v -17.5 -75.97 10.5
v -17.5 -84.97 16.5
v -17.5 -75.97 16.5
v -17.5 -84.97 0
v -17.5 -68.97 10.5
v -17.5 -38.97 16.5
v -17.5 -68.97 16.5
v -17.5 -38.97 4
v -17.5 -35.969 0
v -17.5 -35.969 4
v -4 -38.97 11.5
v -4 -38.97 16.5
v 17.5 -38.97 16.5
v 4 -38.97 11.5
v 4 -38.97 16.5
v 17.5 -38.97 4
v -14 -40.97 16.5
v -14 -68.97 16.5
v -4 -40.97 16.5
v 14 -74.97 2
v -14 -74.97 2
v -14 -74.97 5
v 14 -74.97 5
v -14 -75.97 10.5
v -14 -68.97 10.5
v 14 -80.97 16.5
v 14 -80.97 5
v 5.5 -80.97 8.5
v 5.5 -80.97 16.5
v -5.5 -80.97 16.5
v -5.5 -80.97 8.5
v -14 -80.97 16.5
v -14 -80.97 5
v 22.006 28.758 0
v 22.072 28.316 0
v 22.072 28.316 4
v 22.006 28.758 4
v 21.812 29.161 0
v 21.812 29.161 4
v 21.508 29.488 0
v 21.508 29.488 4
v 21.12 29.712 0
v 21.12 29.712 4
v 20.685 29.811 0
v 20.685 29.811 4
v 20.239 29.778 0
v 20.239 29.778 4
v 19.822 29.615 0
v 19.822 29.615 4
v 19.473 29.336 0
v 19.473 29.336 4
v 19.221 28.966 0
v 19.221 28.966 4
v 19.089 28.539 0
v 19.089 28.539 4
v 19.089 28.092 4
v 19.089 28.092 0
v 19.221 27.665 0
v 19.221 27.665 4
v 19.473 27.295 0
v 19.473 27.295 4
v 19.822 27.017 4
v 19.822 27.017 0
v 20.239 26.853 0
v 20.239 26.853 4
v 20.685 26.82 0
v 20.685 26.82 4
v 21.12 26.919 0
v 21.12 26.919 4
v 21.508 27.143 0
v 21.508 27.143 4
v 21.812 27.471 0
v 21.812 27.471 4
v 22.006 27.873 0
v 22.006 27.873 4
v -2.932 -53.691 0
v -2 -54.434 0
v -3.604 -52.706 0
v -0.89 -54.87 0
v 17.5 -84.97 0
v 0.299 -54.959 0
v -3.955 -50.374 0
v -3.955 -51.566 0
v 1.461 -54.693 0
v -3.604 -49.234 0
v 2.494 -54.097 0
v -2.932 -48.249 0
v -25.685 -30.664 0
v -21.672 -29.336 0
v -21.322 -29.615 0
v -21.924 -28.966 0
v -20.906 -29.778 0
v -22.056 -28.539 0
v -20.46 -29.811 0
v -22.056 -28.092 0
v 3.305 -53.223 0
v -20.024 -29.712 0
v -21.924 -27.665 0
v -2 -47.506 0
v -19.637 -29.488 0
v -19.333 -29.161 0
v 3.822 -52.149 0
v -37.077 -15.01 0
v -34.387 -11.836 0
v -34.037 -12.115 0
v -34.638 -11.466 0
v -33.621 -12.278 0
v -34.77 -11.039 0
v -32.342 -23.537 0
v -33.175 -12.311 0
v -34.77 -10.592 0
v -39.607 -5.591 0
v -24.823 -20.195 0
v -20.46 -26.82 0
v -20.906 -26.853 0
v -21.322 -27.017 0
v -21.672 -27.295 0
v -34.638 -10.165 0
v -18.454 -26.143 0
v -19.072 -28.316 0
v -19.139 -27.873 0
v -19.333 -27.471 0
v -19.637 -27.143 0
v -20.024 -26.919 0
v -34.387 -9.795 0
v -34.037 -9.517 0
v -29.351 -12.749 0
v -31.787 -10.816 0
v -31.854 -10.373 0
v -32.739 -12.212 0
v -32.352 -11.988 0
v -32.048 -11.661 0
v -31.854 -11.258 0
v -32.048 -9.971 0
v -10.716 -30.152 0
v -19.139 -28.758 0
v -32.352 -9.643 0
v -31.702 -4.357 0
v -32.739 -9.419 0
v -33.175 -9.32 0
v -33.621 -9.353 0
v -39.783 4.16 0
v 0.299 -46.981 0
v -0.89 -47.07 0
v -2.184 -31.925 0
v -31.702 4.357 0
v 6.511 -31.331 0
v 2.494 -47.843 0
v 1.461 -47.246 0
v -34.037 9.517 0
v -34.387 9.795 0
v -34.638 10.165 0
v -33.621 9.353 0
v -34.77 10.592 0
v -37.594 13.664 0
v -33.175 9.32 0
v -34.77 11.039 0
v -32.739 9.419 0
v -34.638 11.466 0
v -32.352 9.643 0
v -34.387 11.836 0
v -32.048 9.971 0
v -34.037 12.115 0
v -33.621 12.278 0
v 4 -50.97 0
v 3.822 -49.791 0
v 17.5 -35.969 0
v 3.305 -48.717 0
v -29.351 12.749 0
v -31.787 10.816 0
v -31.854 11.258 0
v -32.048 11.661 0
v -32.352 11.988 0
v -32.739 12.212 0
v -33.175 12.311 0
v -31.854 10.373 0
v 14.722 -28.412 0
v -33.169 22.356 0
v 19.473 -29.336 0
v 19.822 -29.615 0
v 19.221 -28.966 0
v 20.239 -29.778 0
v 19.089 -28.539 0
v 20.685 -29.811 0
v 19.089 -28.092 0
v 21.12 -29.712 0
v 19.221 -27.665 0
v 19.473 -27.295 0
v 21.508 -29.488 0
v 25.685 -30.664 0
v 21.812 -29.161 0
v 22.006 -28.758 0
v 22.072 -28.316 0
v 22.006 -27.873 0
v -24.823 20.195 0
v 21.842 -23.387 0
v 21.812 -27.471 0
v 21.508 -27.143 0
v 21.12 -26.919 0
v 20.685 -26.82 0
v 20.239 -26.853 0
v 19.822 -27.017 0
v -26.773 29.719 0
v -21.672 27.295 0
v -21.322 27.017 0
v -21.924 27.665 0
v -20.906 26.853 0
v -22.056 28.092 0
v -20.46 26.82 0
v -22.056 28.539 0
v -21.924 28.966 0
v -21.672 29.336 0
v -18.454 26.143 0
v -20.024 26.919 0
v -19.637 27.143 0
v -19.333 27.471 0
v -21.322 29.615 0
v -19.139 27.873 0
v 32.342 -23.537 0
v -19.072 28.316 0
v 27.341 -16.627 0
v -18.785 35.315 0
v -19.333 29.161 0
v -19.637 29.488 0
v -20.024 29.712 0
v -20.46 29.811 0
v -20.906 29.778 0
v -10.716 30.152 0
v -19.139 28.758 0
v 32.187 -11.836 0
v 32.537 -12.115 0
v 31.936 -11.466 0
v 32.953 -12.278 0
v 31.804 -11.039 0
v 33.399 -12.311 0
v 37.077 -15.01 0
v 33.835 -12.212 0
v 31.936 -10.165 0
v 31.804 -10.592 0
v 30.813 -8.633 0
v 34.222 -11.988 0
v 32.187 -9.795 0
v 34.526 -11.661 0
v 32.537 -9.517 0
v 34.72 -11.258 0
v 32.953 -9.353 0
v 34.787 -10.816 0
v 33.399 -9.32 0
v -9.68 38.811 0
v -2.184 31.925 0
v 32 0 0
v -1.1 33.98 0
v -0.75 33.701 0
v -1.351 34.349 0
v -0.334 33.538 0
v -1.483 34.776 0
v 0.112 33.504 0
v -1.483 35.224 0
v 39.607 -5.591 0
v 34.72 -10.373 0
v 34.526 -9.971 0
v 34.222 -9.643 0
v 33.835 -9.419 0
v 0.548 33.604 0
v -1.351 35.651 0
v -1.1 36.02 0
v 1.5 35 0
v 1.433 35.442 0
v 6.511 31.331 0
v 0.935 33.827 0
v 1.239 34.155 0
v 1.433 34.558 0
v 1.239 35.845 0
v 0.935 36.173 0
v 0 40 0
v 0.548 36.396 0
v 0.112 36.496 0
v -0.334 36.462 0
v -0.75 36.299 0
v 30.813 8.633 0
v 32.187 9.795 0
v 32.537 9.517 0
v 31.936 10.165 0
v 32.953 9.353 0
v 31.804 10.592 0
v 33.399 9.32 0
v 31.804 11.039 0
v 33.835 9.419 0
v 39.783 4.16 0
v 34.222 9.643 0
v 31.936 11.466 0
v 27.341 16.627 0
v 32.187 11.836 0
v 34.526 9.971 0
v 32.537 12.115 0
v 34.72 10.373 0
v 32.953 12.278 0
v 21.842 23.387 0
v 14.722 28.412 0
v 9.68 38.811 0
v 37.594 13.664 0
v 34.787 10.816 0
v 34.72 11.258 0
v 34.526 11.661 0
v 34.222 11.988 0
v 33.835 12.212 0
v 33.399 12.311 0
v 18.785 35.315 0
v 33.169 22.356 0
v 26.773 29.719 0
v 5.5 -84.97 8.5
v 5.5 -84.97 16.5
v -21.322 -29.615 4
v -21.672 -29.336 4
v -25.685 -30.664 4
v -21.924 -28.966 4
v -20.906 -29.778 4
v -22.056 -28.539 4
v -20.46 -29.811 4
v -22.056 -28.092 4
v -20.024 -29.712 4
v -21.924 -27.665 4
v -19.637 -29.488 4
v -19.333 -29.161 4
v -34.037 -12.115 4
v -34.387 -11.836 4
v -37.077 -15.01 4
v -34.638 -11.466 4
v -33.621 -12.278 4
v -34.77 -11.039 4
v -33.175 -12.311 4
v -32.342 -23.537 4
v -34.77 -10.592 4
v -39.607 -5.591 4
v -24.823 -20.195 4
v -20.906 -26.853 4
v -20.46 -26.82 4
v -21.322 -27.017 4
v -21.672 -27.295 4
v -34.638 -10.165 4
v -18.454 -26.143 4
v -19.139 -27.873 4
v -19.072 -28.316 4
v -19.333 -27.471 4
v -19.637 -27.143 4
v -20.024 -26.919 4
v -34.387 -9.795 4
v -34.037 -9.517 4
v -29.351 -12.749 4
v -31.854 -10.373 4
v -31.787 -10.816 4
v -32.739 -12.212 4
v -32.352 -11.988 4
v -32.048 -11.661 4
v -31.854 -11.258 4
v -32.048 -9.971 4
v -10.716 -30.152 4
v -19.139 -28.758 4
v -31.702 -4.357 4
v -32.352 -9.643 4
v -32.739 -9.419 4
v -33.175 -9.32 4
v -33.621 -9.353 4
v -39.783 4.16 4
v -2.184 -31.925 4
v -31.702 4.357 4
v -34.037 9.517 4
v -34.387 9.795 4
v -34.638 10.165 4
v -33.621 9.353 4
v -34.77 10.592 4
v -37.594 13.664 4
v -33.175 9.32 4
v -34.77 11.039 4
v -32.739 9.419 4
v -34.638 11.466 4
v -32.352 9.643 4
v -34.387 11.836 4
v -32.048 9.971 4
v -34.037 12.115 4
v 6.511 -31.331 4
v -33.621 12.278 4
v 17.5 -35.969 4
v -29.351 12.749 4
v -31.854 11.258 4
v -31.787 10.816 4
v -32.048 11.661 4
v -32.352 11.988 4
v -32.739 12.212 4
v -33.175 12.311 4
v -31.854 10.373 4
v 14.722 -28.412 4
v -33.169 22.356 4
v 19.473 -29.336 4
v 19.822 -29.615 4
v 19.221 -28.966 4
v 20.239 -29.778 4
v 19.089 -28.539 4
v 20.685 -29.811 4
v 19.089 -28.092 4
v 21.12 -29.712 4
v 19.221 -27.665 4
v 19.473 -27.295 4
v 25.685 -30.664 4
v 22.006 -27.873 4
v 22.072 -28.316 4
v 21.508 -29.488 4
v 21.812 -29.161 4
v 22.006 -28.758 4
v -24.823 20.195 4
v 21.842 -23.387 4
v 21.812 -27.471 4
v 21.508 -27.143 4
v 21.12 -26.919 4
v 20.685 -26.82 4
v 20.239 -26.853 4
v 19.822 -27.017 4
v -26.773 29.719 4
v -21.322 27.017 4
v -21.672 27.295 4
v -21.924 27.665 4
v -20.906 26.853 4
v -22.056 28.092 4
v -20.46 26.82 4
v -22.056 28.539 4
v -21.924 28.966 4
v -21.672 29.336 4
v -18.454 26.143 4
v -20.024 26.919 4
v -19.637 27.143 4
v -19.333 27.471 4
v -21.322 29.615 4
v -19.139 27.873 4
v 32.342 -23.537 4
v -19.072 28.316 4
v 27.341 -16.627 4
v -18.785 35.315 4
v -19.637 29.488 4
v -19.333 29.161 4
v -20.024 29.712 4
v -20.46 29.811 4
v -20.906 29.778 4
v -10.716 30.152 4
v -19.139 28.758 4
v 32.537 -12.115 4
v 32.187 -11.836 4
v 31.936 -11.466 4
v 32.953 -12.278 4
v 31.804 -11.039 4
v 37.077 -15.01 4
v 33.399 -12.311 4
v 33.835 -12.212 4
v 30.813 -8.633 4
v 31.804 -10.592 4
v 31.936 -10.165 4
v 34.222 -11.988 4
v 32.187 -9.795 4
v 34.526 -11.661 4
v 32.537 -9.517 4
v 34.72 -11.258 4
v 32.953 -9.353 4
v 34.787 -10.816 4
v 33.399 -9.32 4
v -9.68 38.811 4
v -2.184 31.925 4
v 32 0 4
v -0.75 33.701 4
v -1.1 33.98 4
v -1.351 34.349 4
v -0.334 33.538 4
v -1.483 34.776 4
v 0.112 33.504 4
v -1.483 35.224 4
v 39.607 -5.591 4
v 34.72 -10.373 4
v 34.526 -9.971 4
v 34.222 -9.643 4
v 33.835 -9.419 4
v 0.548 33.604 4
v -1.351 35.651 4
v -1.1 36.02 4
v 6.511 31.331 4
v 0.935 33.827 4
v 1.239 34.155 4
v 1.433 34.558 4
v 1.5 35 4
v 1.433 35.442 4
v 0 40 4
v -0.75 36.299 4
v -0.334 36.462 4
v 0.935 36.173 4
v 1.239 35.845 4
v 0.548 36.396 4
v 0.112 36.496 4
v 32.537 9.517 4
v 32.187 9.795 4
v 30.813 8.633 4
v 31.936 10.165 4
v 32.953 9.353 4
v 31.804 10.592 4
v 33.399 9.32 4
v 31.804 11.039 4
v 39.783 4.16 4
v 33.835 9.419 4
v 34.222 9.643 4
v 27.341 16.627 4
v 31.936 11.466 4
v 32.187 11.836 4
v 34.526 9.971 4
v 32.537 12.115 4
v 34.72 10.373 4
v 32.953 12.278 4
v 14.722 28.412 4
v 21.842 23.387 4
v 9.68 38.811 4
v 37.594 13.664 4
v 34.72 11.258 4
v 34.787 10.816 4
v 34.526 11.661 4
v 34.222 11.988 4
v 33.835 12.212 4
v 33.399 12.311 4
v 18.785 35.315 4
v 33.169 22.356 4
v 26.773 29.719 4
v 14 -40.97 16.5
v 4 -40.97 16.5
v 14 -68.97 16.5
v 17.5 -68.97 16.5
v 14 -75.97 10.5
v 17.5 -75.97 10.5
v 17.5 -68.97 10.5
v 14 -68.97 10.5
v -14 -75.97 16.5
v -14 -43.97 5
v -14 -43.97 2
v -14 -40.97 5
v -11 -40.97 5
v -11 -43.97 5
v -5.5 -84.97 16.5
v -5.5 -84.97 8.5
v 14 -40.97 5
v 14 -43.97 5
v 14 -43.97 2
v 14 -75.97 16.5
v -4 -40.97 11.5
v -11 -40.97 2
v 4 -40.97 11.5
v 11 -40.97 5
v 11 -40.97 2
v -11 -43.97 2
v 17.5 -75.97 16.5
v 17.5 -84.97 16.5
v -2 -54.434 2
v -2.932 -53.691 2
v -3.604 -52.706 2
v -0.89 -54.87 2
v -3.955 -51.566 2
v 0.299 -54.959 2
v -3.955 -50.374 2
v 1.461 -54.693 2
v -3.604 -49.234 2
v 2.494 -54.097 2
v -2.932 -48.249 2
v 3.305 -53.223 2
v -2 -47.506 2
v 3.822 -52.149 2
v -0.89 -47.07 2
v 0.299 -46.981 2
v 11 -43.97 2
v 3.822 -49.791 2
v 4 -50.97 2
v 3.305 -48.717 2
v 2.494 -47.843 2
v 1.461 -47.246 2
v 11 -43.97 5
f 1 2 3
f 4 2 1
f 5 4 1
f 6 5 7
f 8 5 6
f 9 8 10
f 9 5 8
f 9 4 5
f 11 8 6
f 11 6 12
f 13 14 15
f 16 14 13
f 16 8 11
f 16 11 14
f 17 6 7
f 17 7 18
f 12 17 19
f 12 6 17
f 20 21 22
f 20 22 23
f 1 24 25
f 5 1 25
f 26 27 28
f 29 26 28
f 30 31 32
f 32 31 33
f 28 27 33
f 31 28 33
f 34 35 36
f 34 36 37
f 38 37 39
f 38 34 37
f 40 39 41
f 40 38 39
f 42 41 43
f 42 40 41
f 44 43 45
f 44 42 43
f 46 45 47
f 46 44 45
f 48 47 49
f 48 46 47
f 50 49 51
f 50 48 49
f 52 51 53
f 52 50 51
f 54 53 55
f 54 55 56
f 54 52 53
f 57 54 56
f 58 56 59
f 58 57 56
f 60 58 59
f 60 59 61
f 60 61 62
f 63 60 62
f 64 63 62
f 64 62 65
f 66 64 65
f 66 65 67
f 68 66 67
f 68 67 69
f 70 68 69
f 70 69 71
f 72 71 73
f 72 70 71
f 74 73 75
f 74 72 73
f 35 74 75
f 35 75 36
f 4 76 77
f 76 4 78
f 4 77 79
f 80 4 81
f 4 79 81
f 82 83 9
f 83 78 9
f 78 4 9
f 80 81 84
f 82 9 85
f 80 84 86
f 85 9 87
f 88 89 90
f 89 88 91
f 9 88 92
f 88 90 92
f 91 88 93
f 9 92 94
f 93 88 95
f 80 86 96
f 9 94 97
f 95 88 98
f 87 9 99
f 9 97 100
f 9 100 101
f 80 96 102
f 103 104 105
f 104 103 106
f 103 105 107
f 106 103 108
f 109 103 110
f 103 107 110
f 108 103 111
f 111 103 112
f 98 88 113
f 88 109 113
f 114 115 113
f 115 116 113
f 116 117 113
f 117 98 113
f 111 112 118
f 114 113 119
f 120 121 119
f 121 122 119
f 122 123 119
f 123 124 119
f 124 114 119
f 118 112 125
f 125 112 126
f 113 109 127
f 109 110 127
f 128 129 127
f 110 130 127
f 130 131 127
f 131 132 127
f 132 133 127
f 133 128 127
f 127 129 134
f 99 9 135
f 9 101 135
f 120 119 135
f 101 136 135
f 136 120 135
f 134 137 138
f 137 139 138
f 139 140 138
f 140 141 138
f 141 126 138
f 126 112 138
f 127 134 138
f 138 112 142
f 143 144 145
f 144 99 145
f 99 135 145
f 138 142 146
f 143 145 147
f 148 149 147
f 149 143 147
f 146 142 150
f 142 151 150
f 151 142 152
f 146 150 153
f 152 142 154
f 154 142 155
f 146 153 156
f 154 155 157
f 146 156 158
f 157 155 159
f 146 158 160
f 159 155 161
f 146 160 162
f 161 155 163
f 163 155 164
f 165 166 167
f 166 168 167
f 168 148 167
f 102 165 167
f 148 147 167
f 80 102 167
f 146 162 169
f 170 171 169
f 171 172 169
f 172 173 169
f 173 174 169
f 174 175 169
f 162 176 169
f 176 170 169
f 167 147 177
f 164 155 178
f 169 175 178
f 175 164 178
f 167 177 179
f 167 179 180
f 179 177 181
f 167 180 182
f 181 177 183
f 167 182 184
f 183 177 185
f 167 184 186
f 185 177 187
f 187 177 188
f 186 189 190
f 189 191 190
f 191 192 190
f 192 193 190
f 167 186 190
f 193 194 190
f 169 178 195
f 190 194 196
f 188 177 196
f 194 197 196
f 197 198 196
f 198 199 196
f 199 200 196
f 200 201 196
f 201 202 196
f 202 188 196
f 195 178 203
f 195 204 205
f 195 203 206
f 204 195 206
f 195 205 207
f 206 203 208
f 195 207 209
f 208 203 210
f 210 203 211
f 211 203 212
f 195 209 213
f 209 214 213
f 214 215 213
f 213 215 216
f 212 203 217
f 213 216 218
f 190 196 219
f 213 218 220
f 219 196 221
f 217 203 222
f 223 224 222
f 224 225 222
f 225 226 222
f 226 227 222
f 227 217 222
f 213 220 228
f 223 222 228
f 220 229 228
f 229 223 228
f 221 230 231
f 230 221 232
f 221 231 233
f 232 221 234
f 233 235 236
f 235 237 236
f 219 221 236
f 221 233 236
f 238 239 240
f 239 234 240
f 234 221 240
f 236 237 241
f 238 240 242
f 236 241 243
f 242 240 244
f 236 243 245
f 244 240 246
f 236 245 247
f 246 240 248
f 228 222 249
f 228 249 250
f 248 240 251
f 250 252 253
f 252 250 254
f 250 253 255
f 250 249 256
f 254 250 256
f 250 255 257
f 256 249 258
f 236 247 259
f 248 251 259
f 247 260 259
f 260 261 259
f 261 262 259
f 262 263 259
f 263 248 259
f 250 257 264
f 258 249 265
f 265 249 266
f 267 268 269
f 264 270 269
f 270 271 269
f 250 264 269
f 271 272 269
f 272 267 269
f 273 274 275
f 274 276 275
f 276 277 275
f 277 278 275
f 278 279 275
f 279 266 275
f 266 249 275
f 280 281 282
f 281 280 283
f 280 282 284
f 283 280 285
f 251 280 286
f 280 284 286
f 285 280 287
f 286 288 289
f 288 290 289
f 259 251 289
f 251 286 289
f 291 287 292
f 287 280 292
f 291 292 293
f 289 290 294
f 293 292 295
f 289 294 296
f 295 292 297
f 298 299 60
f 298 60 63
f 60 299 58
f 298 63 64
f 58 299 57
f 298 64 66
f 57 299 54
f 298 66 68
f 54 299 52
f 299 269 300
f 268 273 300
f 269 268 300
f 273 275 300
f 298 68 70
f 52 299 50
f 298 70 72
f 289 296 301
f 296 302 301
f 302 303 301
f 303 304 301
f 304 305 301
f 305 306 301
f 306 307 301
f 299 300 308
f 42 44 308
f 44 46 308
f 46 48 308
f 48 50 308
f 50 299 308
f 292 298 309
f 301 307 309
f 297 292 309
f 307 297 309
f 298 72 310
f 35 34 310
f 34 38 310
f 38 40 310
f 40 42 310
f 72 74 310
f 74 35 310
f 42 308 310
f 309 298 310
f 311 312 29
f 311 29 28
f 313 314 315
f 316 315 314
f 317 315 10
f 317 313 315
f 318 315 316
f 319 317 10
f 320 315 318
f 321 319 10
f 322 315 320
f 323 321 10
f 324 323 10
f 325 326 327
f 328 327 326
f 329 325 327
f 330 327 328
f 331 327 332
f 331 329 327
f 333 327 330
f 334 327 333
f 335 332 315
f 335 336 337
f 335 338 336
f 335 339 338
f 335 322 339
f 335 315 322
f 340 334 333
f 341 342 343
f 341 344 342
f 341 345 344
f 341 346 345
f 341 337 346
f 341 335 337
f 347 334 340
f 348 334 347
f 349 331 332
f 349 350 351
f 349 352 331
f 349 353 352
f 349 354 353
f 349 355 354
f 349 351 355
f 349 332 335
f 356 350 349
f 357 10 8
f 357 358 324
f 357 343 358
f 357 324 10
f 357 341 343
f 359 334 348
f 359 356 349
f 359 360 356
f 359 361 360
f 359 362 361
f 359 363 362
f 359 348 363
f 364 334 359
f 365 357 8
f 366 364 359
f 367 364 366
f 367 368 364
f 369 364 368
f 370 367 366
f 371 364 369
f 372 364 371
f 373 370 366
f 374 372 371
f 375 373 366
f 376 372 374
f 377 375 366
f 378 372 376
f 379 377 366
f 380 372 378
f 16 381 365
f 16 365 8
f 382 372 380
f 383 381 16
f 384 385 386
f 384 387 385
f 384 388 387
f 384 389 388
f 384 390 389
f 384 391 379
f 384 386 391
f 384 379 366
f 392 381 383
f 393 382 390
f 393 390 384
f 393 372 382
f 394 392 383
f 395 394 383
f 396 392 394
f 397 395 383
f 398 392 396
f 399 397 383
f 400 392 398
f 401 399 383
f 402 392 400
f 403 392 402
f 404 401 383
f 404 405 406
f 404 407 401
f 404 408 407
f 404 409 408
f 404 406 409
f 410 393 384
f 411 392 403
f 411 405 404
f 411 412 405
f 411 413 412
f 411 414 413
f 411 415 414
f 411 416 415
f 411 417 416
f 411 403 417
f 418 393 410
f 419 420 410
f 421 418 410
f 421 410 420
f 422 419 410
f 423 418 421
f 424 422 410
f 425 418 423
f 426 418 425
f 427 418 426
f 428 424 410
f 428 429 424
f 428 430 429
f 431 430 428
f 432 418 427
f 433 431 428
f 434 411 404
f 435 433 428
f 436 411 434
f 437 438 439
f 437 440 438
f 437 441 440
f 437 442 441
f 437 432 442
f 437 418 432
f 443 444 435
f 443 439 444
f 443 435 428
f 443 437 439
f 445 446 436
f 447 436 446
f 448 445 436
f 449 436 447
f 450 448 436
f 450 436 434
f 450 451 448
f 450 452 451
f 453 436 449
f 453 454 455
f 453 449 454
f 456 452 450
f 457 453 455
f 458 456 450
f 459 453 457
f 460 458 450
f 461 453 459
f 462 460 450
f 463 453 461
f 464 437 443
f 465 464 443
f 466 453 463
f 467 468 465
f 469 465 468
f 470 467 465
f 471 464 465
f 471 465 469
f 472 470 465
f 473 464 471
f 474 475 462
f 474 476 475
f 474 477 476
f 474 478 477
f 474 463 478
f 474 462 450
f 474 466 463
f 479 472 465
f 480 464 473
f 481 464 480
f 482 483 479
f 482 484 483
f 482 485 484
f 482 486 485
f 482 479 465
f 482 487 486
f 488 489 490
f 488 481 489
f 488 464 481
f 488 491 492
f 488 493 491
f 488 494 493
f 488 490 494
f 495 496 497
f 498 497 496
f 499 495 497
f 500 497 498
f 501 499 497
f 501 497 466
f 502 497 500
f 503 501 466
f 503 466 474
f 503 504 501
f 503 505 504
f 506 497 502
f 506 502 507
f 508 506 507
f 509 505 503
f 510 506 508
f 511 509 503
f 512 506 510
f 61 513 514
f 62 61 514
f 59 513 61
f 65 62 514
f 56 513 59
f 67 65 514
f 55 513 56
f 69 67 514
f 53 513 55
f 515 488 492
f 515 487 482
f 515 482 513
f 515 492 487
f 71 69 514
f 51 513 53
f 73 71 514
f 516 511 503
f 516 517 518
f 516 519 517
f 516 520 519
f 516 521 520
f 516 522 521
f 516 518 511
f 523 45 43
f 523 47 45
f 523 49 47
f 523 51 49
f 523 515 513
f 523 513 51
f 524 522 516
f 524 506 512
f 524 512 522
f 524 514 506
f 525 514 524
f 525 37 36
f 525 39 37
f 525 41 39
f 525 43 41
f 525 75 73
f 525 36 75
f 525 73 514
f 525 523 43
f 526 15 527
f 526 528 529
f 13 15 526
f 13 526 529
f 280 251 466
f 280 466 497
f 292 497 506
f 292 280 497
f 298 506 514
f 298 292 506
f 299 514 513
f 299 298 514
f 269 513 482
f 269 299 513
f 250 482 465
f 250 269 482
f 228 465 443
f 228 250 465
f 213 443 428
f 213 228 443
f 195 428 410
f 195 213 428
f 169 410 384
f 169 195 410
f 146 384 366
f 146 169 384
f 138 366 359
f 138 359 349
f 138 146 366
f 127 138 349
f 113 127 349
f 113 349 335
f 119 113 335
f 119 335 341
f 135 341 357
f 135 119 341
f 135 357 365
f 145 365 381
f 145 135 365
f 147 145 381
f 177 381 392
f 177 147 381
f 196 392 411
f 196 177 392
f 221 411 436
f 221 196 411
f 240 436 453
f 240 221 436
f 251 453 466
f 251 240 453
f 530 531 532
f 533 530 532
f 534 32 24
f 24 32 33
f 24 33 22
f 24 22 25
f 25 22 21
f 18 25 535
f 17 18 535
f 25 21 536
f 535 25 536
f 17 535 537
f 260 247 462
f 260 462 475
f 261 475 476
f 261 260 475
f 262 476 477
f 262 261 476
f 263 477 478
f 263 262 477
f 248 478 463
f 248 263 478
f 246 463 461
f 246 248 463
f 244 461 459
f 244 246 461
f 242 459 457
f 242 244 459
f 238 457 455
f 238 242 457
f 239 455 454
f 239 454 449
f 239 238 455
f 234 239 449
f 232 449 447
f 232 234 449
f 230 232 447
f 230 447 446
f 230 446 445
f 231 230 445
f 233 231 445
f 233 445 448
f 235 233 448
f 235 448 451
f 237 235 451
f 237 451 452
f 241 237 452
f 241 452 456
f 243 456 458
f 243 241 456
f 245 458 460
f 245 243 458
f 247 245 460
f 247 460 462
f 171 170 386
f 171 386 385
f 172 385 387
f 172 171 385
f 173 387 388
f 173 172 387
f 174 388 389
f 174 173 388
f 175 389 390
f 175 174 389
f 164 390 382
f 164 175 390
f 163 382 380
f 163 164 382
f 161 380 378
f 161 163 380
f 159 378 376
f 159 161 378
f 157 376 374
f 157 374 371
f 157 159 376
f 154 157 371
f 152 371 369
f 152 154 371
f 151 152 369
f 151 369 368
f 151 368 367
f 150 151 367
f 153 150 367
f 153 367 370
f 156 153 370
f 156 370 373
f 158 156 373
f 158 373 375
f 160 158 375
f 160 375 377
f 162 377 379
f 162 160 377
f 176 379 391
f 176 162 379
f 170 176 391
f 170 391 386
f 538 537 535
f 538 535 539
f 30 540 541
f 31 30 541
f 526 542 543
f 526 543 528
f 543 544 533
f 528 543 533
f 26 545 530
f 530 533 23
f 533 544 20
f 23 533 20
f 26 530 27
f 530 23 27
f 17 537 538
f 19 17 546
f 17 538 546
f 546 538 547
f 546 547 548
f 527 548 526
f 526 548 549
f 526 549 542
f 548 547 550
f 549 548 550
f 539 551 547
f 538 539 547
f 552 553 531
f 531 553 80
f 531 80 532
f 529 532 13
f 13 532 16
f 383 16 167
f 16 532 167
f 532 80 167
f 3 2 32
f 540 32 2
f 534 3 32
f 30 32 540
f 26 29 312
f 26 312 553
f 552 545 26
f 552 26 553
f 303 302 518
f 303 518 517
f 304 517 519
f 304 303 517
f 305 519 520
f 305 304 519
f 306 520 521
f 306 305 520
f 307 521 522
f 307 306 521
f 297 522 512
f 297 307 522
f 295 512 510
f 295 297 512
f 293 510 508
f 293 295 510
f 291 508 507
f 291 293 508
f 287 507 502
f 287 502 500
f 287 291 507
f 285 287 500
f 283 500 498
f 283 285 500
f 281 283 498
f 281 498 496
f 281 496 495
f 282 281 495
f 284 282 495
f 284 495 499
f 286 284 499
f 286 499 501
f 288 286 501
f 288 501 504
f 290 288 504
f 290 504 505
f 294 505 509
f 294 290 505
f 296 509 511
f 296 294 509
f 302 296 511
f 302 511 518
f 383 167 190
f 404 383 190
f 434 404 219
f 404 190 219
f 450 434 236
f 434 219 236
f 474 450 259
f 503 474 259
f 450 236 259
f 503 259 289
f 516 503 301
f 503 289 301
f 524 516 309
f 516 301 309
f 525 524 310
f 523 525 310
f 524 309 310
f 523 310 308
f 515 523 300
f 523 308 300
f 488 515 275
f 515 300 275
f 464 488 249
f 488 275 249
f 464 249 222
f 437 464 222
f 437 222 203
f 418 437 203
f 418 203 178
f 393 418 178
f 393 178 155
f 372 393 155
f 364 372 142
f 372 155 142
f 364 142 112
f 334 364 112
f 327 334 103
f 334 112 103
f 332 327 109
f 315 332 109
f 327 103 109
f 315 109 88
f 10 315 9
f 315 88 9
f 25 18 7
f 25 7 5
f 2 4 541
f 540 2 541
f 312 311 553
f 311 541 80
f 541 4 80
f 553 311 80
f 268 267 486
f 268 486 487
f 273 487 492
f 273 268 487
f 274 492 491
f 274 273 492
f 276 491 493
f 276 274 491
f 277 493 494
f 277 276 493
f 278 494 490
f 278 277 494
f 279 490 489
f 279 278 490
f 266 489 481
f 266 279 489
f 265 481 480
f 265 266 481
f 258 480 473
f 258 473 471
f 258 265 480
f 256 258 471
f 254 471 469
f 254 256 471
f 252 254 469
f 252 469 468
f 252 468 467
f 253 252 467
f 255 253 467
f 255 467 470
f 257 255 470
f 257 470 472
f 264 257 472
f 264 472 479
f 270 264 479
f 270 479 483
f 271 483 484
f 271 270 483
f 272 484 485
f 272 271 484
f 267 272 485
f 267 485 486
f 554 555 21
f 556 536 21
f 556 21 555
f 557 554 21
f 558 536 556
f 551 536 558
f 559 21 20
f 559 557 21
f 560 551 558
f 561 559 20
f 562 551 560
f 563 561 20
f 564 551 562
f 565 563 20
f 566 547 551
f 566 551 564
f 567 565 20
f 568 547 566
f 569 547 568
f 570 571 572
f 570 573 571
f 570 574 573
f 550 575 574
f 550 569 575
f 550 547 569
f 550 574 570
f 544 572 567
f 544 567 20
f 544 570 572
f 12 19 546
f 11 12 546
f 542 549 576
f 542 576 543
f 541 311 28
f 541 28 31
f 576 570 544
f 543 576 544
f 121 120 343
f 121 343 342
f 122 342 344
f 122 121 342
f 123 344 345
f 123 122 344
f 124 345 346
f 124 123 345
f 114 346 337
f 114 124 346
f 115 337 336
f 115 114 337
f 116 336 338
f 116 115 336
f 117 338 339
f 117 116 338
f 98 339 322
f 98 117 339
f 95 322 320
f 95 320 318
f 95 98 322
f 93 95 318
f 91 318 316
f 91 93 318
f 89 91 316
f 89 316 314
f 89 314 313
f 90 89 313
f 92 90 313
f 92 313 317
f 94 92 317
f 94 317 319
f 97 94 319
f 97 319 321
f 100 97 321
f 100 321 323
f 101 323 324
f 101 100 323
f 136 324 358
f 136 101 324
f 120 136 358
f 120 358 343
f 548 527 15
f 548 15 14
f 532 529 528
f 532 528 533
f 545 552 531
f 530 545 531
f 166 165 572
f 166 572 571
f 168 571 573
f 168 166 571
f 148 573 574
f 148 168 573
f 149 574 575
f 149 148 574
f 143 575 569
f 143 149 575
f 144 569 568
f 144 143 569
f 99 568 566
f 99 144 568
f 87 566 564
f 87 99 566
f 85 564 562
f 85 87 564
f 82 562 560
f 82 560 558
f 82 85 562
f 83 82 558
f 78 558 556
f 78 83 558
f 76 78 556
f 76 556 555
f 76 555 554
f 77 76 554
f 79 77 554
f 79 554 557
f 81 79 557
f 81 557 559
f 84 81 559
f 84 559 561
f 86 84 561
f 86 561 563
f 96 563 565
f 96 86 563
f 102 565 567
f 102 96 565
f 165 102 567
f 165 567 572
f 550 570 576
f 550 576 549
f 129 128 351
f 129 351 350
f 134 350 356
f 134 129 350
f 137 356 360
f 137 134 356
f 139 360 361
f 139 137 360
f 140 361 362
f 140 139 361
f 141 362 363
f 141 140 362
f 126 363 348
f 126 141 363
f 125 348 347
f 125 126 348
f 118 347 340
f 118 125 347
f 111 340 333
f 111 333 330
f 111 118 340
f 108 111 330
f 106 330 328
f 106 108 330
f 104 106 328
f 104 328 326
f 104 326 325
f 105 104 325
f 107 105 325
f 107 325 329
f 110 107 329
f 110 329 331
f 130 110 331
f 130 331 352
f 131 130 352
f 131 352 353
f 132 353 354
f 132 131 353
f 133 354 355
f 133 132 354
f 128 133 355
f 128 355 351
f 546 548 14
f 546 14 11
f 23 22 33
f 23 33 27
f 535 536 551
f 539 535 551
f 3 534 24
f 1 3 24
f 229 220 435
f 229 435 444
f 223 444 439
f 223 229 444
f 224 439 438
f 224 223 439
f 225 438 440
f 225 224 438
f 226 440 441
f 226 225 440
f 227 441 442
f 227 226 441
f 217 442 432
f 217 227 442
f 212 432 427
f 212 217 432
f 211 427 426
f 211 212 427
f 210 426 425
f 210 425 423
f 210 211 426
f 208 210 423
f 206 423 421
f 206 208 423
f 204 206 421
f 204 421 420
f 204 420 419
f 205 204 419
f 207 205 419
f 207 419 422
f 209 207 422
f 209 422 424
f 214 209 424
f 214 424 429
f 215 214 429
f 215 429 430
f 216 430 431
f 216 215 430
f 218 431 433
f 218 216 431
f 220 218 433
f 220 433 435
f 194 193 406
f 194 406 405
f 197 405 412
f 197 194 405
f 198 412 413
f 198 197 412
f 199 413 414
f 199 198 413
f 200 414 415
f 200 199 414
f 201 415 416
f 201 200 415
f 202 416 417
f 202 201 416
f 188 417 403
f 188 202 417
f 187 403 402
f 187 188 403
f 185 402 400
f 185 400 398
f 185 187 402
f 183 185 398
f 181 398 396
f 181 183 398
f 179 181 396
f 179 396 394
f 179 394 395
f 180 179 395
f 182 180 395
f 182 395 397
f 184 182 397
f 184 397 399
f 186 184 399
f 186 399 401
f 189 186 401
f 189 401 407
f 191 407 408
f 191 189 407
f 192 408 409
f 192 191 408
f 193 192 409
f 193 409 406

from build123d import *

# Parameters (mm, degrees)
SKETCH1_R             = 1.5
SKETCH1_R_2           = 32
BOSS_EXTRUDE1_DEPTH   = 4
SKETCH1_3_R           = 4
BOSS_EXTRUDE2_DEPTH   = 2
SKETCH1_11_W          = 28
SKETCH1_11_H          = 6
BOSS_EXTRUDE4_DEPTH   = 5
SKETCH1_11_W_2        = 3
SKETCH1_11_H_2        = 3
BOSS_EXTRUDE4_2_DEPTH = 5
BOSS_EXTRUDE4_3_DEPTH = 5
SKETCH1_21_W          = 35
SKETCH1_21_H          = 46
BOSS_EXTRUDE7_DEPTH   = 16.5
SKETCH3_W             = 6
SKETCH3_H             = 7
CUT_EXTRUDE1_DEPTH    = 35.5
SKETCH4_W             = 11
SKETCH4_H             = 8
CUT_EXTRUDE2_DEPTH    = 4
SKETCH5_W             = 8
SKETCH5_H             = 5
CUT_EXTRUDE3_DEPTH    = 52


with BuildPart() as part:
    # Sketch1 → Boss-Extrude1 (new body)
    with BuildSketch(Plane.XY):
        with BuildLine():
            Line((-17.5, -38.96998799), (17.5, -38.96998799))
            Line((17.5, -38.96998799), (17.5, -35.968736425))
            ThreePointArc((17.5, -35.968736425), (0, 40), (-17.5, -35.968736425))
            Line((-17.5, -35.968736425), (-17.5, -38.96998799))
        make_face()
        with Locations((-20.57248383, -28.315594803)):
            Circle(SKETCH1_R, mode=Mode.SUBTRACT)
        with Locations((20.57248383, -28.315594803)):
            Circle(SKETCH1_R, mode=Mode.SUBTRACT)
        with Locations((-33.28697807, -10.815594803)):
            Circle(SKETCH1_R, mode=Mode.SUBTRACT)
        Circle(SKETCH1_R_2, mode=Mode.SUBTRACT)
        with Locations((-33.28697807, 10.815594803)):
            Circle(SKETCH1_R, mode=Mode.SUBTRACT)
        with Locations((-20.57248383, 28.315594803)):
            Circle(SKETCH1_R, mode=Mode.SUBTRACT)
        with Locations((0, 35)):
            Circle(SKETCH1_R, mode=Mode.SUBTRACT)
        with Locations((33.28697807, -10.815594803)):
            Circle(SKETCH1_R, mode=Mode.SUBTRACT)
        with Locations((33.28697807, 10.815594803)):
            Circle(SKETCH1_R, mode=Mode.SUBTRACT)
        with Locations((20.57248383, 28.315594803)):
            Circle(SKETCH1_R, mode=Mode.SUBTRACT)
    extrude(amount=BOSS_EXTRUDE1_DEPTH)



with BuildPart() as body_2:
    # Sketch1<3> → Boss-Extrude2 (new body)
    with BuildSketch(Plane.XY):
        Polygon((11, -40.96998799), (-11, -40.96998799), (-11, -43.96998799), (-14, -43.96998799), (-14, -74.96998799), (14, -74.96998799), (14, -43.96998799), (11, -43.96998799), align=None)
        with Locations((0, -50.96998799)):
            Circle(SKETCH1_3_R, mode=Mode.SUBTRACT)
    extrude(amount=BOSS_EXTRUDE2_DEPTH)


with BuildPart() as body_3:
    # Sketch1<11> → Boss-Extrude4 (new body)
    with BuildSketch(Plane.XY):
        with Locations((0, -77.96998799)):
            Rectangle(SKETCH1_11_W, SKETCH1_11_H)
    extrude(amount=BOSS_EXTRUDE4_DEPTH)


with BuildPart() as body_4:
    # Sketch1<11> → Boss-Extrude4 2 (new body)
    with BuildSketch(Plane.XY):
        with Locations((-12.5, -42.46998799)):
            Rectangle(SKETCH1_11_W_2, SKETCH1_11_H_2)
    extrude(amount=BOSS_EXTRUDE4_2_DEPTH)


with BuildPart() as body_5:
    # Sketch1<11> → Boss-Extrude4 3 (new body)
    with BuildSketch(Plane.XY):
        with Locations((12.5, -42.46998799)):
            Rectangle(SKETCH1_11_W_2, SKETCH1_11_H_2)
    extrude(amount=BOSS_EXTRUDE4_3_DEPTH)


with BuildPart() as part_1:
    add(part.part)

    add(body_2.part)  # Boss-Extrude7 merges body 2

    add(body_3.part)  # Boss-Extrude7 merges body 3

    add(body_4.part)  # Boss-Extrude7 merges body 4

    add(body_5.part)  # Boss-Extrude7 merges body 5
    # Sketch1<21> → Boss-Extrude7 (add)
    with BuildSketch(Plane.XY):
        with Locations((0, -61.96998799)):
            Rectangle(SKETCH1_21_W, SKETCH1_21_H)
        Polygon((-14, -43.96998799), (-14, -40.96998799), (-11, -40.96998799), (11, -40.96998799), (14, -40.96998799), (14, -43.96998799), (14, -74.96998799), (14, -80.96998799), (-14, -80.96998799), (-14, -74.96998799), align=None, mode=Mode.SUBTRACT)
    extrude(amount=BOSS_EXTRUDE7_DEPTH)

    # Sketch3 → Cut-Extrude1 (cut)
    with BuildSketch(Plane(origin=(17.5, 0, 0), x_dir=(0, 0, -1), z_dir=(1, 0, 0))):
        with Locations((-13.5, -72.46998799)):
            Rectangle(SKETCH3_W, SKETCH3_H)
    extrude(amount=-CUT_EXTRUDE1_DEPTH, mode=Mode.SUBTRACT)

    # Sketch4 → Cut-Extrude2 (cut)
    with BuildSketch(Plane(origin=(0, -84.96998799, 0), x_dir=(-1, 0, 0), z_dir=(0, -1, 0))):
        with Locations((0, -12.5)):
            Rectangle(SKETCH4_W, SKETCH4_H)
    extrude(amount=-CUT_EXTRUDE2_DEPTH, mode=Mode.SUBTRACT)

    # Sketch5 → Cut-Extrude3 (cut)
    with BuildSketch(Plane(origin=(0, -84.96998799, 0), x_dir=(-1, 0, 0), z_dir=(0, -1, 0))):
        with Locations((0, -14)):
            Rectangle(SKETCH5_W, SKETCH5_H)
    extrude(amount=-CUT_EXTRUDE3_DEPTH, mode=Mode.SUBTRACT)


solid = part_1.part
